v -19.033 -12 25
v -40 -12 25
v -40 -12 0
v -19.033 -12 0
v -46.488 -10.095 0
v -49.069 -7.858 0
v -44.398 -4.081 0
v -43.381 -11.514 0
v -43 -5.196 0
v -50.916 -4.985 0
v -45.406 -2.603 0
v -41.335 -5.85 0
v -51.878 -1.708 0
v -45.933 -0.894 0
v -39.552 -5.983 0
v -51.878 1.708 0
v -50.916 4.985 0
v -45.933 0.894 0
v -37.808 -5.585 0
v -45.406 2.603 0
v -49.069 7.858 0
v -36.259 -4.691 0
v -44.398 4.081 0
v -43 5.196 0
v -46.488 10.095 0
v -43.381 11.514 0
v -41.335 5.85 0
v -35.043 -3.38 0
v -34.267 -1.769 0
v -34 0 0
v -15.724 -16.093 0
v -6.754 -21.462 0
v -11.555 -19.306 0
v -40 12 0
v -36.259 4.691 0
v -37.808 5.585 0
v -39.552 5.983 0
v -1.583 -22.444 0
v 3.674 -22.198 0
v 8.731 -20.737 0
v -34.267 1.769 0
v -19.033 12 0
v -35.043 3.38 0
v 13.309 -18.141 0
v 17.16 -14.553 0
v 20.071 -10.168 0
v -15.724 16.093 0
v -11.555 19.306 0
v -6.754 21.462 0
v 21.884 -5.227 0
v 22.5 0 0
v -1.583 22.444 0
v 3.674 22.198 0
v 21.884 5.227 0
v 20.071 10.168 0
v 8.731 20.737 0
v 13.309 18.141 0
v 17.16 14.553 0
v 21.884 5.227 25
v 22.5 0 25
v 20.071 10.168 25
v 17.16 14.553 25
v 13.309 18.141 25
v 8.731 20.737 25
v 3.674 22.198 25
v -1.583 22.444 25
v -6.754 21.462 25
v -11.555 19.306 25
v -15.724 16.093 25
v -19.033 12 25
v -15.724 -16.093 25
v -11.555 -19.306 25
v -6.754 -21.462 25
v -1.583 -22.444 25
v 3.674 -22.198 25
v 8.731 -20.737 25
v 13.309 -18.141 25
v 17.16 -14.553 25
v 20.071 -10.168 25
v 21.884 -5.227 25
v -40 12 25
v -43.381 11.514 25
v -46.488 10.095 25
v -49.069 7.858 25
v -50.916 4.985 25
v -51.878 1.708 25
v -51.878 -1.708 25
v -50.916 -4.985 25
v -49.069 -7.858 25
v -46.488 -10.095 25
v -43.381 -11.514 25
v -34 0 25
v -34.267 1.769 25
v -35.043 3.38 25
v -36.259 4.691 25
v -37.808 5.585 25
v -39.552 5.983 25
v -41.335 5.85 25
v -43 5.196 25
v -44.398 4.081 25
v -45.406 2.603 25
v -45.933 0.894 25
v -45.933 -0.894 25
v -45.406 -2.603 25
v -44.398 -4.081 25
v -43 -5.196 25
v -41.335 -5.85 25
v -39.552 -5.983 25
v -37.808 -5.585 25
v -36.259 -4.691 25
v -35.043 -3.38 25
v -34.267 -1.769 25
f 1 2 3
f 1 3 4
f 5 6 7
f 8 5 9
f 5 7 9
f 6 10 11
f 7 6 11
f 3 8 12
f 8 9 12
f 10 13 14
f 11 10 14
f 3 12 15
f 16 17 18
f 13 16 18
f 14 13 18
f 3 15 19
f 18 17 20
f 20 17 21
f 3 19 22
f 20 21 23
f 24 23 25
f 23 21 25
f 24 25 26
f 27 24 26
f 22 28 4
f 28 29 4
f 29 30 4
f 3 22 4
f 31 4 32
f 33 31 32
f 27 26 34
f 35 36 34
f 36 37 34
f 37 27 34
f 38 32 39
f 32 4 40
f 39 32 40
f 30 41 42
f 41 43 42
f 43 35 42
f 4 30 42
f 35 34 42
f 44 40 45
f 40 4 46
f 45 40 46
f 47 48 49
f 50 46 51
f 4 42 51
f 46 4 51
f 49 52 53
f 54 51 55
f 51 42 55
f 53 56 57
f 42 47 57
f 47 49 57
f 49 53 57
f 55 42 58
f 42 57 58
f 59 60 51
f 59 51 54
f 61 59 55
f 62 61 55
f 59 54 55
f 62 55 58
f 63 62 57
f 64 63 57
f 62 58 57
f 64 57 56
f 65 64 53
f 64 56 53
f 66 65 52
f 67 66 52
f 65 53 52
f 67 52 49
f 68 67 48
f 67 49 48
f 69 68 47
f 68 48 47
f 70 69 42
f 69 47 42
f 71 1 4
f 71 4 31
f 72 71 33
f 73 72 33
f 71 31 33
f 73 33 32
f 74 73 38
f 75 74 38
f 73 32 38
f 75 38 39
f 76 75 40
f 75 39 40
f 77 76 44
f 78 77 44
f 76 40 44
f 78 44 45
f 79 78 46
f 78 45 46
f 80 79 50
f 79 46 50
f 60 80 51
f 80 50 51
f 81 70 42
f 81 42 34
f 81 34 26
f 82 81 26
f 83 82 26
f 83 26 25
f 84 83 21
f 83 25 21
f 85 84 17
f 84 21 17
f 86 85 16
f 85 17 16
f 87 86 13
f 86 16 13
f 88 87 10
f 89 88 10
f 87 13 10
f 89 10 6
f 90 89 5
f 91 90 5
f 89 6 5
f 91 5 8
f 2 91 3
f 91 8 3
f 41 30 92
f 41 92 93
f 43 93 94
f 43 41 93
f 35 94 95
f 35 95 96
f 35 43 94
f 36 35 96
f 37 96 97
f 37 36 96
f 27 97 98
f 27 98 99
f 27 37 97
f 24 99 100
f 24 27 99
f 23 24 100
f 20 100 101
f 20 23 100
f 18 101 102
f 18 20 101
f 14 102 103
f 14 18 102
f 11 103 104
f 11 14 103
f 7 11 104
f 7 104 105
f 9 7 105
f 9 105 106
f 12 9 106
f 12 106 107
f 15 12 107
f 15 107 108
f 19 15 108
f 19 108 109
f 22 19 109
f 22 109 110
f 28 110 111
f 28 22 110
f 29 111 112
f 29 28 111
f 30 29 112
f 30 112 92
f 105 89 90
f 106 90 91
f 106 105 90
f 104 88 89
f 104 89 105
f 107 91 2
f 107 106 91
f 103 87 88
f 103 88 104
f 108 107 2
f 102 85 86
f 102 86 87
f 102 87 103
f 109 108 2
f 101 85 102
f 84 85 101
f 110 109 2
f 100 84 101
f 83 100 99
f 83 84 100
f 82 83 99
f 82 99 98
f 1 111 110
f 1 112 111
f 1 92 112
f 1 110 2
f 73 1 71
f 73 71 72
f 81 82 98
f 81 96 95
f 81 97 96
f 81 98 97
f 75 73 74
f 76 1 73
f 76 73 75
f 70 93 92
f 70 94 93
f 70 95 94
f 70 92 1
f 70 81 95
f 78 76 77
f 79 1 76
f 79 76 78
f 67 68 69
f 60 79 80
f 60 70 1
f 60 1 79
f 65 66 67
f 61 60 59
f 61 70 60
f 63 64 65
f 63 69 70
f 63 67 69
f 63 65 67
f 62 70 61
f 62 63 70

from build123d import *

# Parameters (mm, degrees)
F0_R     = 6
F1_DEPTH = 25


with BuildPart() as f1:
    # F0 (on Top) → F1 (new body)
    with BuildSketch(Plane.XY):
        with BuildLine():
            ThreePointArc((-19.032866, -12), (6.245419, -21.615845), (22.5, 0))
            ThreePointArc((22.5, 0), (6.245419, 21.615845), (-19.032866, 12))
            ThreePointArc((-19.032866, 12), (-22.5, 0), (-19.032866, -12))
        make_face()
        with BuildLine():
            ThreePointArc((-19.032866, -12), (-22.5, 0), (-19.032866, 12))
            Line((-19.032866, 12), (-40, 12))
            ThreePointArc((-40, 12), (-52, 0), (-40, -12))
            Line((-40, -12), (-19.032866, -12))
        make_face()
        with Locations((-40, 0)):
            Circle(F0_R, mode=Mode.SUBTRACT)
    extrude(amount=F1_DEPTH)


solid = f1.part
